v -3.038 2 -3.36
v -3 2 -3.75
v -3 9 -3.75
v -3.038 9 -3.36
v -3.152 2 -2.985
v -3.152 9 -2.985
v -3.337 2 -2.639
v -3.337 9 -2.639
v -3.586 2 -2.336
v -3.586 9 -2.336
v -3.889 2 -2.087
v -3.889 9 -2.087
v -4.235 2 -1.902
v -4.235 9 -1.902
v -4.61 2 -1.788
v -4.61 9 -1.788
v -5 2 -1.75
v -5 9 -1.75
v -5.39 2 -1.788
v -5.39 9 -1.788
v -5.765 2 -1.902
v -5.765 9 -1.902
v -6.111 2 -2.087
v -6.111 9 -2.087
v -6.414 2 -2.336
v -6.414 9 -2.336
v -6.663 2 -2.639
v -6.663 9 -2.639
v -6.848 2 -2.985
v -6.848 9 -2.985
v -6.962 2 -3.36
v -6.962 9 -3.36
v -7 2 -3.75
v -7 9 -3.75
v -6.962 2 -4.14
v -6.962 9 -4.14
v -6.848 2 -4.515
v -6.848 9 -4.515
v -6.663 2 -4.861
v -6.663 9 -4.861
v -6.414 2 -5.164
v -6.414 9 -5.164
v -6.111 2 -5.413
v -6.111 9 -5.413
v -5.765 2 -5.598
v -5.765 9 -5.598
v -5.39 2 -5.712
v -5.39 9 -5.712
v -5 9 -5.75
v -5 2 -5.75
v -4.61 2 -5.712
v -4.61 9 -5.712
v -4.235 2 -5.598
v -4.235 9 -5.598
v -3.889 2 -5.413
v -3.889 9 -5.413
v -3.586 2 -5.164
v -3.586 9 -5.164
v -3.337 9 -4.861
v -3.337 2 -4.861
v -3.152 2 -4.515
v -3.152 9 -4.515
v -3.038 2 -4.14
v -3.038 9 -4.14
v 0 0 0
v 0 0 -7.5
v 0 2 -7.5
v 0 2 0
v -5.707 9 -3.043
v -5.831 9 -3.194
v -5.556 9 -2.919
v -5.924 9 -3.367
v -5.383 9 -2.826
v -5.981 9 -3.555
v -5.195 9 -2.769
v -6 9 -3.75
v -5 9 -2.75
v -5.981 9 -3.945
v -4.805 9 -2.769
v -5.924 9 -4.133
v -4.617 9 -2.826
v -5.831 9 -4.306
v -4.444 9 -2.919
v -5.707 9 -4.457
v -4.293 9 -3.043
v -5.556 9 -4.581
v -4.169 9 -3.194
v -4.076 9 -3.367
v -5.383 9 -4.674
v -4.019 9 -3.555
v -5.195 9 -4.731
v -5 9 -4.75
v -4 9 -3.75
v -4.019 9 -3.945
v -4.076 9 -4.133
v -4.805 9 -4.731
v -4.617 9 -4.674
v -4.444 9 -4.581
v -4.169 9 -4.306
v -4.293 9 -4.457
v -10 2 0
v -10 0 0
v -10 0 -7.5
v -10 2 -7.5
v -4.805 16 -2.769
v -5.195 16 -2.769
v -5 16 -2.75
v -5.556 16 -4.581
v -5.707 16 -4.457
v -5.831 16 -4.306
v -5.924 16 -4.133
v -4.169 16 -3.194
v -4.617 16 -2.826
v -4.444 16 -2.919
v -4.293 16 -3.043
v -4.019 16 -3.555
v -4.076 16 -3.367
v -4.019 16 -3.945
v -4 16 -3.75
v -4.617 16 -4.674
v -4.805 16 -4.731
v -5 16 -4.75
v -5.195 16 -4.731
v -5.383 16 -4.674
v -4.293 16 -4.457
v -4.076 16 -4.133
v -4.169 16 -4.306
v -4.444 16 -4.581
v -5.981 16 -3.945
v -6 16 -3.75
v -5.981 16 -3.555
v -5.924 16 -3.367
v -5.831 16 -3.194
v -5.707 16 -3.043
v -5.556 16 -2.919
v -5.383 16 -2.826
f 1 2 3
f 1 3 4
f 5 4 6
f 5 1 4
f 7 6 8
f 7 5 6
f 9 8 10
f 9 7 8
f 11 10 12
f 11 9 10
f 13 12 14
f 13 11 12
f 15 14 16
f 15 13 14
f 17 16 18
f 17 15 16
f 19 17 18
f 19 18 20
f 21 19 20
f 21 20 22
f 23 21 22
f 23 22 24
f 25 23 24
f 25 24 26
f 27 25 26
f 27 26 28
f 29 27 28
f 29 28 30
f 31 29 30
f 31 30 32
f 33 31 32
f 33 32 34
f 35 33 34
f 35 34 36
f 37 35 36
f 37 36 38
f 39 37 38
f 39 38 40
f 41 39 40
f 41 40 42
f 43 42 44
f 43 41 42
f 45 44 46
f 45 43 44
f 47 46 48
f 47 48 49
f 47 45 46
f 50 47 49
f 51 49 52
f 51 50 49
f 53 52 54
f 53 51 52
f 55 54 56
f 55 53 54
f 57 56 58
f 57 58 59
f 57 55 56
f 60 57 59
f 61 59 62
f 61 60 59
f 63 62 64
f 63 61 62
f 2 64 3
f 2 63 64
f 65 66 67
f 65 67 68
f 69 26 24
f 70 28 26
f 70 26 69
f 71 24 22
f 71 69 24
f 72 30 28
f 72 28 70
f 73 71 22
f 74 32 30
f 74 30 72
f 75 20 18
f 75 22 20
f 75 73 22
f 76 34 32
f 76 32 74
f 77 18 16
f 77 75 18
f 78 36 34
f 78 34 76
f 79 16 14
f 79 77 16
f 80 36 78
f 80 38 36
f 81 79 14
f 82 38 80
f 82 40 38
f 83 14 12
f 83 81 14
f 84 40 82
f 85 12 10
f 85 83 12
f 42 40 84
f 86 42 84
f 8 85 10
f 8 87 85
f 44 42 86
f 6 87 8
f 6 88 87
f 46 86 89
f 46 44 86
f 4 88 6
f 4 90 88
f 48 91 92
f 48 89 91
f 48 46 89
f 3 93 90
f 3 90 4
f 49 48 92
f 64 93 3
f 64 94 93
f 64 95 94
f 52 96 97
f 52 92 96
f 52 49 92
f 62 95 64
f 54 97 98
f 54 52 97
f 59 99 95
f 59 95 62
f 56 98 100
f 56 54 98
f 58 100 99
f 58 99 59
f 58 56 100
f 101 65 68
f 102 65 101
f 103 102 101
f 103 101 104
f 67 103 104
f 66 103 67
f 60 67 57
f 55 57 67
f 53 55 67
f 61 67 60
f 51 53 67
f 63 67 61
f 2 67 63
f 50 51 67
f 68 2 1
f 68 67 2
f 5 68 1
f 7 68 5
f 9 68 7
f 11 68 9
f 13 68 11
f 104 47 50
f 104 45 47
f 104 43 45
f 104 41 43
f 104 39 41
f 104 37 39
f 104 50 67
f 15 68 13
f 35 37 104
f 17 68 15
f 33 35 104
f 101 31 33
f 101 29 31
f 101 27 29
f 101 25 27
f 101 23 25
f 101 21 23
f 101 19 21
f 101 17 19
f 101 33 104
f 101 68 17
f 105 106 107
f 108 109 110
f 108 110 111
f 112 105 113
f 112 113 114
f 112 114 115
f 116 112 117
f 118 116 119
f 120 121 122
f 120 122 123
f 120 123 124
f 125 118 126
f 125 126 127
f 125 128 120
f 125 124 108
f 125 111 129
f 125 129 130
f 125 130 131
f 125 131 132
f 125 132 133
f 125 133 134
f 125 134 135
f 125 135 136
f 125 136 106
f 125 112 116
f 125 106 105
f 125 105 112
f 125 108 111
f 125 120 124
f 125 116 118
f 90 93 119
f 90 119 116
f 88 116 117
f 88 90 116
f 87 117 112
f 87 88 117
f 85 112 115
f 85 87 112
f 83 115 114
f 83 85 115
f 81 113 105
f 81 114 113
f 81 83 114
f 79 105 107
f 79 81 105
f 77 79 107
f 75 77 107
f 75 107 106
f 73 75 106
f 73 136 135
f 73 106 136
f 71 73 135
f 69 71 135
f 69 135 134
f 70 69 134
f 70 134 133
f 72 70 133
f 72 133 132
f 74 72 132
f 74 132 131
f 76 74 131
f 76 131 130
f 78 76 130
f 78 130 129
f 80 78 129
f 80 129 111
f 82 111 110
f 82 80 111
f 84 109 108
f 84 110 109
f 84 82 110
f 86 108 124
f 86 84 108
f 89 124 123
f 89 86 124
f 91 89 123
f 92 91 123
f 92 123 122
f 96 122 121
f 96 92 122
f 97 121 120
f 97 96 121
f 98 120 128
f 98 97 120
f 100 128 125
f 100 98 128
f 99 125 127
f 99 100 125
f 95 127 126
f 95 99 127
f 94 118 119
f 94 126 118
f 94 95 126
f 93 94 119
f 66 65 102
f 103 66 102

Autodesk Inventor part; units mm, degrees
ref_plane "YZ Plane" through (0, 0, 0) normal (1, 0, 0) x (0, 1, 0)
ref_plane "XZ Plane" through (0, 0, 0) normal (0, 1, 0) x (-1, 0, 0)
ref_plane "XY Plane" through (0, 0, 0) normal (0, 0, 1) x (1, 0, 0)
sketch "Sketch1" plane through (0, 0, 0) normal (0, 1, 0) x (-1, 0, 0)
  line L0 (0, 0) -> (10, 0)
  line L1 (10, 0) -> (10, -7.5)
  line L2 (10, -7.5) -> (0, -7.5)
  line L3 (0, -7.5) -> (0, 0)
  dimension "d0" = 10
  dimension "d1" = 7.5
extrude "Extrusion1" add sketch "Sketch1" along normal blind 2
sketch "Sketch2" plane through (0, 2, 0) normal (0, 1, 0) x (1, 0, 0)
  line L0 (-10, 7.5) -> (-10, 0) projected
  line L1 (-10, 0) -> (-5, 0)
  line L2 (-5, 0) -> (-5, 3.75)
  line L3 (-5, 3.75) -> (-10, 3.75)
  line L4 (-10, 3.75) -> (-10, 0)
  circle A0 centre (-5, 3.75) radius 2
  point P0 (0, 0)
  dimension "d4" = 5
  dimension "d5" = 3.75
  dimension "d6" = 4
extrude "Extrusion2" add sketch "Sketch2" along normal blind 7 contours A0 L2 L3 | L3 L2 A0
sketch "Sketch3" plane through (-5, 9, -3.75) normal (0, 1, 0) x (1, 0, 0)
  circle A0 centre (0, 0) radius 1
  point P0 (5, -3.75)
  dimension "d9" = 2
extrude "Extrusion3" add sketch "Sketch3" along normal blind 7
properties part number "LaserMountMount"
